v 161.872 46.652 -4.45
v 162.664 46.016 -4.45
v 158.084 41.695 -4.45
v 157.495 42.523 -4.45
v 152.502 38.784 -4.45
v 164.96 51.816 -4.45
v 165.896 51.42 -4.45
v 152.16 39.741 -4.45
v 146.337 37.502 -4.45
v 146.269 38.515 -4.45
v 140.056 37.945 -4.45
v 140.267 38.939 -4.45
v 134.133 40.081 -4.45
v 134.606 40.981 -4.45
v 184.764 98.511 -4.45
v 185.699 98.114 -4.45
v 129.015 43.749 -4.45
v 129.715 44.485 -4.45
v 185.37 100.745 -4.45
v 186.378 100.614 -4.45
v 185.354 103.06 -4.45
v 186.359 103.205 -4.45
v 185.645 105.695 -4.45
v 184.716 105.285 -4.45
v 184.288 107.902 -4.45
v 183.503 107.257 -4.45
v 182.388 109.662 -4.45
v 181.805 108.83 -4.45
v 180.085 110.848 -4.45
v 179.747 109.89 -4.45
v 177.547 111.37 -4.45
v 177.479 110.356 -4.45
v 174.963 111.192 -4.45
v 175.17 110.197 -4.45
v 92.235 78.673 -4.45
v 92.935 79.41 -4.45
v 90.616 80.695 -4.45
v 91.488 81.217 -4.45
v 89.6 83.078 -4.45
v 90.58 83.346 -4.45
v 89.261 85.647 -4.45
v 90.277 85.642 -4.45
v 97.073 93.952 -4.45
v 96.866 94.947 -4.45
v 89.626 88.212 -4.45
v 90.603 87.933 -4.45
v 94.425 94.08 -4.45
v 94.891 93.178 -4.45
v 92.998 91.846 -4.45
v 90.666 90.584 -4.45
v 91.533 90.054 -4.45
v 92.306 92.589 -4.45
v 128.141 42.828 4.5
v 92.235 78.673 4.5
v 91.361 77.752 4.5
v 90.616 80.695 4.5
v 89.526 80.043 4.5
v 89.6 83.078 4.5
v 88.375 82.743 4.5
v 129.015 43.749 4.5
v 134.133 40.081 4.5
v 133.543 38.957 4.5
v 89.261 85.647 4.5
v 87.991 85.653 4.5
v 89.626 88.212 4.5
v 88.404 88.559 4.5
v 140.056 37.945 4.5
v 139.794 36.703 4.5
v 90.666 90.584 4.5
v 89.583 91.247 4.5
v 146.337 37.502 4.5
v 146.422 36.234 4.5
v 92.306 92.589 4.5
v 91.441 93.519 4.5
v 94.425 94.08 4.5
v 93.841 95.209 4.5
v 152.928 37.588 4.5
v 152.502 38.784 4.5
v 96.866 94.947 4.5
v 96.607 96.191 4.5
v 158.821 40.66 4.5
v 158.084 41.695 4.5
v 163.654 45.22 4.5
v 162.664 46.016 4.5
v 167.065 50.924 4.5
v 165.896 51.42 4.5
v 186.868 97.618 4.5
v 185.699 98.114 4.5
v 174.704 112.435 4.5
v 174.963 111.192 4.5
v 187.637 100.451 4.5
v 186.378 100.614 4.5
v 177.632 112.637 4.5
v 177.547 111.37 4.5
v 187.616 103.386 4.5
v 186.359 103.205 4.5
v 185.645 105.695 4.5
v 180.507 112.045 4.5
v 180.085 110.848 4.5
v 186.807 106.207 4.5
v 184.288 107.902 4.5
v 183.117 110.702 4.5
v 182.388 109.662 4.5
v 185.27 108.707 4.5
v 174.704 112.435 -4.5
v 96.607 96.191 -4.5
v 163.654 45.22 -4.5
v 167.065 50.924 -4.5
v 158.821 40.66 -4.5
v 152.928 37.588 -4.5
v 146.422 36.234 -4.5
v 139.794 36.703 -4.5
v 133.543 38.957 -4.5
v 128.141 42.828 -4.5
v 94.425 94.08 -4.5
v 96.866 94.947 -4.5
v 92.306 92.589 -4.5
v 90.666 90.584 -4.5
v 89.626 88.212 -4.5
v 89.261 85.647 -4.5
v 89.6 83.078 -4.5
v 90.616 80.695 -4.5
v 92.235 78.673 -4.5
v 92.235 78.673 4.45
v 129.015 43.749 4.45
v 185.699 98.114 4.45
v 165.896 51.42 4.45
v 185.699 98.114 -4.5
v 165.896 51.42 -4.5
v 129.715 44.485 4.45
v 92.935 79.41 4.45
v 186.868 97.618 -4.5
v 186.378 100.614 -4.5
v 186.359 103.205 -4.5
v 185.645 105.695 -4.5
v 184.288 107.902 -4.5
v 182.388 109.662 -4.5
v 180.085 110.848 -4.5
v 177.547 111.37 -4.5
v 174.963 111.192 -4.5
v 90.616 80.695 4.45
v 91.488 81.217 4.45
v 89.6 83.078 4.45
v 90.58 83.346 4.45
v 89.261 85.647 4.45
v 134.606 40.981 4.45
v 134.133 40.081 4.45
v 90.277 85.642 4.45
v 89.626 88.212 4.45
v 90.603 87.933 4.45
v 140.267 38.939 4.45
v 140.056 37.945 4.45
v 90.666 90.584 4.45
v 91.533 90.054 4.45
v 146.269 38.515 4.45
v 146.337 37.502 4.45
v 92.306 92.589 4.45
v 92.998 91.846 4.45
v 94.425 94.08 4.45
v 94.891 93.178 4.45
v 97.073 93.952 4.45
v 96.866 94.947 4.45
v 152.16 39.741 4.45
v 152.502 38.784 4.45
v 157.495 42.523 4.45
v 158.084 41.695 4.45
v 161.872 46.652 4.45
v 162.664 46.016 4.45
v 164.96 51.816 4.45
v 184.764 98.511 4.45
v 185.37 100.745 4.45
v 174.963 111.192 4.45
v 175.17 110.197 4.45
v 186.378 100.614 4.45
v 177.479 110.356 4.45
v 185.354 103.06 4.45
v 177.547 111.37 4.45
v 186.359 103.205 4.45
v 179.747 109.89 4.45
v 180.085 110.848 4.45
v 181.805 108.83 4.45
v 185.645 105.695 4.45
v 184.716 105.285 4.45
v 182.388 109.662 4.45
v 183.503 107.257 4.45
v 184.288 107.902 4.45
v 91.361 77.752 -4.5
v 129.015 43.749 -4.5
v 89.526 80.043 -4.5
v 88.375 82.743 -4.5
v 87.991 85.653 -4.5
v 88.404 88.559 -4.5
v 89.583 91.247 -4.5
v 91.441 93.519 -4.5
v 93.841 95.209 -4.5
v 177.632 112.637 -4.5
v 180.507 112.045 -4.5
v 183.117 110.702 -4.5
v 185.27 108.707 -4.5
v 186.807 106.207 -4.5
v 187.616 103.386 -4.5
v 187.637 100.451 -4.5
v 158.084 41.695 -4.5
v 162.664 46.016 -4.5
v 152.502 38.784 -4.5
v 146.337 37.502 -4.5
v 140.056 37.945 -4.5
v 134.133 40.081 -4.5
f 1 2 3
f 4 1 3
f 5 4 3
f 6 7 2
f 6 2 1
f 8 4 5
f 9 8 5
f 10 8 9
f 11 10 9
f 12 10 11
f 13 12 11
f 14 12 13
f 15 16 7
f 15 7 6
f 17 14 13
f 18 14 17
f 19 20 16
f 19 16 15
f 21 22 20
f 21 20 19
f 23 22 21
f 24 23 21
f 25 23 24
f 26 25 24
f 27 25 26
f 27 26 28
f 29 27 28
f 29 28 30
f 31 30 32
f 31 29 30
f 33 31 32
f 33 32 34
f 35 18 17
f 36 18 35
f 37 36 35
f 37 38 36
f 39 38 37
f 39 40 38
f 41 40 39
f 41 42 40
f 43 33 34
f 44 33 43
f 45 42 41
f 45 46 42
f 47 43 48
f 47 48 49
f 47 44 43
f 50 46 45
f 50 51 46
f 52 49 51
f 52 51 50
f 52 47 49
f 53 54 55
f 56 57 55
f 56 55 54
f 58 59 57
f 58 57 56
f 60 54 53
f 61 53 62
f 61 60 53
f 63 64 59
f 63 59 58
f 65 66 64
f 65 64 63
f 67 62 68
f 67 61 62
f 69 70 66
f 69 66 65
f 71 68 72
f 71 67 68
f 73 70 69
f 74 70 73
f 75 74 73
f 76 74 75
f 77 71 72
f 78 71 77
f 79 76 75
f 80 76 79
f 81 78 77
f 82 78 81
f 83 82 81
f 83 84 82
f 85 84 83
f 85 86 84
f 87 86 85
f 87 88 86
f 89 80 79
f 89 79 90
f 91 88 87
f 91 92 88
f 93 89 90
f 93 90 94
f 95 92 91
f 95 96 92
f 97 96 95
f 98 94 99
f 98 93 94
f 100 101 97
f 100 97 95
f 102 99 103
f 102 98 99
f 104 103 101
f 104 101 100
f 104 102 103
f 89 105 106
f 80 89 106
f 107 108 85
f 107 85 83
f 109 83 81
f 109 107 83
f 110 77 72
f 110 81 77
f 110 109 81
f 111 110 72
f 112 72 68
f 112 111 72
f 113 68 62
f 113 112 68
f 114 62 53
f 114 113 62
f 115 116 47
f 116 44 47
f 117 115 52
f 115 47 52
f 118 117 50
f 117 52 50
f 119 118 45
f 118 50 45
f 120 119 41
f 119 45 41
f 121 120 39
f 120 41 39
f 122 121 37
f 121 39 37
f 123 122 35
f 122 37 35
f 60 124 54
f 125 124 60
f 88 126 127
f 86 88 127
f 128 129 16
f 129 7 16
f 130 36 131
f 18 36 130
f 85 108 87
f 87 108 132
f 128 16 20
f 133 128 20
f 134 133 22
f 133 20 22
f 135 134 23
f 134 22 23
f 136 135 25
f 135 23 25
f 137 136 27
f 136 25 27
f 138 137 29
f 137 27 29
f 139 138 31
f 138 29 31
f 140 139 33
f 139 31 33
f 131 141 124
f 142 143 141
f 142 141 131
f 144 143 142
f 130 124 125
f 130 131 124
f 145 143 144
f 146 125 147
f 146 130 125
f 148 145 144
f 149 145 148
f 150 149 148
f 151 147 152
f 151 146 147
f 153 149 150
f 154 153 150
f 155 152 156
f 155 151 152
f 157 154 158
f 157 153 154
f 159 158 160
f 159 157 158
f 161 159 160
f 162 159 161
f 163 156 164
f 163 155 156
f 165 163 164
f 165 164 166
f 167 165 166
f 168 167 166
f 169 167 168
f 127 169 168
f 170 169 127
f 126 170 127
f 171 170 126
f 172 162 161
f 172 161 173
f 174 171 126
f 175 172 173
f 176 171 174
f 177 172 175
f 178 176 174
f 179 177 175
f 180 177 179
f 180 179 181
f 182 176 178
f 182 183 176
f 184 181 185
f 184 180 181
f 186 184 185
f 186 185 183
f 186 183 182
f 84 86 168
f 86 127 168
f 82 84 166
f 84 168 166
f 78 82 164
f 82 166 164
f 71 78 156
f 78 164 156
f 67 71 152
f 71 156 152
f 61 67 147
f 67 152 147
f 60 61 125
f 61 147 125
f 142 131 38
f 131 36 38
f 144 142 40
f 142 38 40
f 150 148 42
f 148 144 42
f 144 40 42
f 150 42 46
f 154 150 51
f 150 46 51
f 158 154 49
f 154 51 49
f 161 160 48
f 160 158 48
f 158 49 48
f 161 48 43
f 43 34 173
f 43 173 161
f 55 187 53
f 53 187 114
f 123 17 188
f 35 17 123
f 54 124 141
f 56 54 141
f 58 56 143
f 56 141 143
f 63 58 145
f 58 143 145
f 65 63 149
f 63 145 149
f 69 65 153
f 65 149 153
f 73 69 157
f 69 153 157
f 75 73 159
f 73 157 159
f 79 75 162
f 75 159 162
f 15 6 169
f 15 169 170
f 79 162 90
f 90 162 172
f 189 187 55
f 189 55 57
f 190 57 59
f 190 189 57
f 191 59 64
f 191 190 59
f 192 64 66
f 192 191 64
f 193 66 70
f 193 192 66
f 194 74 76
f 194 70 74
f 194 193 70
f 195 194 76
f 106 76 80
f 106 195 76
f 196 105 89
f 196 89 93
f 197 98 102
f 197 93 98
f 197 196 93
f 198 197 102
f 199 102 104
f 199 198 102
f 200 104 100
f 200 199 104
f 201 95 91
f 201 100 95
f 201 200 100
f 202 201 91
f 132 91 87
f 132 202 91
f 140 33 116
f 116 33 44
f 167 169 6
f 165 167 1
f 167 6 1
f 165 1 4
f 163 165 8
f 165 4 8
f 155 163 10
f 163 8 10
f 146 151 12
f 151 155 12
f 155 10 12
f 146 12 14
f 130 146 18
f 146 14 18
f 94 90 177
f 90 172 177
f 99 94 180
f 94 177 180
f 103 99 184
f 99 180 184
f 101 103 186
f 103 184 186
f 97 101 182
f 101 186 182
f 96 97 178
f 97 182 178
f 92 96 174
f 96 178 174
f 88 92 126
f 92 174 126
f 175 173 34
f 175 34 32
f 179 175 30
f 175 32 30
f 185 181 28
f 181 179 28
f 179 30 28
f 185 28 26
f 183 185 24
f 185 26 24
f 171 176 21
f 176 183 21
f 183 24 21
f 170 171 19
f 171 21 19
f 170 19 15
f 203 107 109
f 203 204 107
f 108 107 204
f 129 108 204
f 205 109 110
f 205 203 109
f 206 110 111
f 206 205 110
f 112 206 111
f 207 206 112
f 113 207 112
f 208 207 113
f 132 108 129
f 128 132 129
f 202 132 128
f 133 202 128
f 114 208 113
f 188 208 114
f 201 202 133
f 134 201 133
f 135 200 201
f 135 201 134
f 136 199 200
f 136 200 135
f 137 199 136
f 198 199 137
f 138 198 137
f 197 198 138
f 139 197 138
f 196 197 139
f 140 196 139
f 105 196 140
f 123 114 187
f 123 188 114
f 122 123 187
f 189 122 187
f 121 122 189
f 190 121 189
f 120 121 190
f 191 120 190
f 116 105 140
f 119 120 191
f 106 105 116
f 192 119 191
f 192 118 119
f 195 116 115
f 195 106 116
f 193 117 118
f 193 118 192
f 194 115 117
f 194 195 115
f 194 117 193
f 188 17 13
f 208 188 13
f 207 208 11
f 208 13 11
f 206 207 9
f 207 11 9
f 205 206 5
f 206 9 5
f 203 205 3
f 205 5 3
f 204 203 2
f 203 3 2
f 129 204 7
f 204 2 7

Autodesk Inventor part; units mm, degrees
ref_plane "YZ Plane" through (0, 0, 0) normal (1, 0, 0) x (0, 1, 0)
ref_plane "XZ Plane" through (0, 0, 0) normal (0, 1, 0) x (-1, 0, 0)
ref_plane "XY Plane" through (0, 0, 0) normal (0, 0, 1) x (1, 0, 0)
sketch "Main Outline" plane through (0, 0, 0) normal (0, 0, 1) x (1, 0, 0)
  line L0 (0, 0) -> (304.8, 0) construction
  line L1 (304.8, 0) -> (304.8, 50.8) construction
  line L2 (304.8, 50.8) -> (0, 50.8) construction
  line L3 (0, 50.8) -> (0, 0) construction
  line L4 (0, 50.8) -> (0, 53.34) construction
  line L5 (0, 53.34) -> (304.8, 53.34) construction
  line L6 (304.8, 53.34) -> (304.8, 50.8) construction
  circle A0 centre (152.4, 23.8125) radius 17.4625 construction
  line L7 (152.4, 23.8125) -> (152.4, 0) construction
  circle A1 centre (152.4, 23.8125) radius 27.94 construction
  circle A2 centre (152.4, 23.8125) radius 21.59 construction
  line L8 (152.4, 23.8125) -> (144.7964, 60.3681) construction
  circle A3 centre (144.7964, 60.3681) radius 15.24 construction
  circle A4 centre (144.7964, 60.3681) radius 8.89 construction
  circle A5 centre (144.7964, 60.3681) radius 14.2875 construction
  arc A6 (164.6591, 71.8014) -> (129.0153, 43.7486) centre (144.7964, 60.3681) ccw construction
  circle A7 centre (98.8106, 85.598) radius 32.258 construction
  circle A8 centre (126.6733, 147.4971) radius 32.258 construction
  circle A9 centre (176.9075, 101.8424) radius 32.258 construction
  circle A10 centre (144.7964, 60.3681) radius 11.1125 construction
  circle A11 centre (152.4, 23.8125) radius 49.53 construction
  line L9 (144.7964, 60.3681) -> (126.6733, 147.4971) construction
  line L10 (144.7964, 60.3681) -> (98.8106, 85.598) construction
  line L11 (98.8106, 85.598) -> (176.9075, 101.8424) construction
  line L12 (176.9075, 101.8424) -> (144.7964, 60.3681) construction
  circle A12 centre (98.8106, 85.598) radius 9.5493 construction
  arc A13 (174.9629, 111.1915) -> (185.6989, 98.1139) centre (176.9075, 101.8424) ccw construction
  circle A14 centre (126.6733, 147.4971) radius 9.5493 construction
  line L13 (96.8659, 94.9472) -> (174.9629, 111.1915) construction
  line L14 (185.6989, 98.1139) -> (165.8956, 51.4198) construction
  line L15 (92.2351, 78.6732) -> (129.0153, 43.7486) construction
  line L16 (174.9629, 111.1915) -> (176.9075, 101.8424) construction
  line L17 (176.9075, 101.8424) -> (185.6989, 98.1139) construction
  arc A15 (185.6989, 98.1139) -> (174.9629, 111.1915) centre (176.9075, 101.8424) ccw construction
  arc A16 (165.8956, 51.4198) -> (164.6591, 71.8014) centre (144.7964, 60.3681) ccw construction
  arc A17 (129.0153, 43.7486) -> (165.8956, 51.4198) centre (144.7964, 60.3681) ccw construction
  circle A18 centre (126.6086, 147.808) radius 32.258 construction
  circle A19 centre (126.544, 148.1188) radius 32.258 construction
  circle A20 centre (126.4793, 148.4297) radius 32.258 construction
  line L18 (126.6733, 147.4971) -> (126.4793, 148.4297) construction
  circle A21 centre (126.738, 147.1863) radius 32.258 construction
  circle A22 centre (117.4622, 43.2997) radius 9.525 construction
  circle A23 centre (176.6694, 55.615) radius 9.525 construction
  line L19 (152.4, 23.8125) -> (117.4622, 43.2997) construction
  line L20 (152.4, 23.8125) -> (176.6694, 55.615) construction
  line L21 (117.4622, 43.2997) -> (98.8106, 85.598) construction
  line L22 (176.6694, 55.615) -> (176.9075, 101.8424) construction
  circle A24 centre (135.1821, 106.5897) radius 7.9375 construction
  line L23 (135.6243, 150.8242) -> (166.2787, 68.353) construction
  circle A25 centre (152.4, 23.8125) radius 29.845 construction
  line L24 (117.1381, 146.979) -> (121.9118, 59.1246) construction
  circle A26 centre (99.0889, 85.4453) radius 32.258 construction
  circle A27 centre (97.9755, 86.0562) radius 32.258 construction
  line L25 (97.9755, 86.0562) -> (98.8106, 85.598) construction
  circle A28 centre (98.2538, 85.9034) radius 32.258 construction
  circle A29 centre (98.5322, 85.7507) radius 32.258 construction
  circle A30 centre (152.4, 23.8125) radius 29.845 construction
  circle A31 centre (122.555, 23.8125) radius 6.35 construction
  circle A32 centre (179.7696, 35.7133) radius 6.35 construction
  line L26 (122.555, 23.8125) -> (152.4, 23.8125) construction
  line L27 (152.4, 23.8125) -> (182.245, 23.8125) construction
  circle A33 centre (182.245, 23.8125) radius 6.35 construction
  circle A34 centre (125.0304, 11.9117) radius 6.35 construction
  circle A35 centre (150.4199, 33.3321) radius 39.5684 construction
  line L28 (72.9795, 65.6655) -> (119.7593, 8.3204) construction
  circle A36 centre (177.4906, 102.5955) radius 32.258 construction
  line L29 (176.9075, 101.8424) -> (177.4906, 102.5955) construction
  circle A37 centre (177.2963, 102.3445) radius 32.258 construction
  circle A38 centre (177.1019, 102.0934) radius 32.258 construction
  circle A39 centre (176.7131, 101.5913) radius 32.258 construction
  line L30 (188.5109, 22.6209) -> (208.5442, 93.8632) construction
  circle A40 centre (135.1821, 106.5897) radius 9.5727 construction
  arc A41 (86.8202, 116.3239) -> (96.3065, 136.4856) centre (81.3304, 131.2195) ccw construction
  arc A42 (158.9123, 149.5077) -> (175.6513, 134.801) centre (174.7462, 150.6502) ccw construction
  line L31 (126.4793, 148.4297) -> (126.9966, 145.9429) construction
  line L32 (116.5322, 146.3607) -> (117.0495, 143.8739) construction
  line L33 (136.9437, 148.0119) -> (136.4264, 150.4987) construction
  arc A43 (136.4264, 150.4987) -> (116.5322, 146.3607) centre (126.4793, 148.4297) ccw construction
  arc A44 (117.0495, 143.8739) -> (136.9437, 148.0119) centre (126.9966, 145.9429) ccw construction
  line L34 (177.4906, 102.5955) -> (175.9357, 100.5871) construction
  line L35 (169.4571, 108.8154) -> (167.9021, 106.807) construction
  line L36 (183.9692, 94.3672) -> (185.5242, 96.3756) construction
  arc A45 (185.5242, 96.3756) -> (169.4571, 108.8154) centre (177.4906, 102.5955) ccw construction
  arc A46 (167.9021, 106.807) -> (183.9692, 94.3672) centre (175.9357, 100.5871) ccw construction
  line L37 (97.9755, 86.0562) -> (100.2023, 84.8344) construction
  line L38 (93.0884, 77.1487) -> (95.3153, 75.927) construction
  line L39 (105.0894, 93.7418) -> (102.8625, 94.9636) construction
  arc A47 (102.8625, 94.9636) -> (93.0884, 77.1487) centre (97.9755, 86.0562) ccw construction
  arc A48 (95.3153, 75.927) -> (105.0894, 93.7418) centre (100.2023, 84.8344) ccw construction
  circle A49 centre (117.4622, 43.2997) radius 3.9687 construction
  circle A50 centre (176.6694, 55.615) radius 3.9687 construction
  line L40 (152.4, 23.8125) -> (158.4777, -5.4071) construction
  arc A51 (89.4797, 54.6517) -> (86.0737, 49.6139) centre (88.534, 51.6209) ccw construction
  arc A52 (202.9367, 73.9217) -> (197.8043, 77.1835) centre (199.8802, 74.7812) ccw construction
  circle A53 centre (152.4, 23.8125) radius 14.224 construction
  circle A54 centre (135.1821, 106.5897) radius 3.9687 construction
  circle A55 centre (156.538, 3.9183) radius 6.35 construction
  circle A56 centre (156.538, 3.9183) radius 2.0828 construction
  circle A57 centre (152.4, 23.8125) radius 20.32 construction
  line L41 (133.1021, 30.1759) -> (152.4, 23.8125) construction
  line L42 (152.4, 23.8125) -> (167.5599, 37.3432) construction
  circle A58 centre (167.5599, 37.3432) radius 2.0828 construction
  circle A59 centre (167.5599, 37.3432) radius 3.9687 construction
  circle A60 centre (133.1021, 30.1759) radius 2.0828 construction
  circle A61 centre (133.1021, 30.1759) radius 3.9688 construction
  point P0 (126.738, 147.1863)
  point P1 (176.7131, 101.5913)
  dimension "d18" = 99.06
  dimension "d58" = 64.516
  dimension "d86" = 64.516
  dimension "d0" = 304.8
  dimension "d1" = 50.8
  dimension "d2" = 2.54
  dimension "d3" = 34.925
  dimension "d4" = 23.8125
  dimension "d5" = 152.4
  dimension "d6" = 55.88
  dimension "d7" = 43.18
  dimension "d8" = 37.338
  dimension "d10" = 30.48
  dimension "d11" = 17.78
  dimension "d12" = 28.575
  dimension "d13" = 45.8366
  dimension "d14" = 64.516
  dimension "d15" = 64.516
  dimension "d16" = 64.516
  dimension "d17" = 22.225
  dimension "d19" = 52.4523
  dimension "d20" = 88.9939
  dimension "d21" = 19.0986
  dimension "d22" = 19.0986
  dimension "d23" = 19.0986
  dimension "d30" = 124.732
  dimension "d40" = 64.516
  dimension "d41" = 64.516
  dimension "d42" = 64.516
  dimension "d43" = 0.9525
  dimension "d44" = 0.3175
  dimension "d45" = 0.635
  dimension "d46" = 64.516
  dimension "d47" = 0.3175
  dimension "d48" = 19.05
  dimension "d49" = 19.05
  dimension "d50" = 40.005
  dimension "d51" = 40.005
  dimension "d52" = 46.228
  dimension "d54" = 46.228
  dimension "d55" = 15.875
  dimension "d56" = 41.4655
  dimension "d57" = 59.69
  dimension "d59" = 64.516
  dimension "d60" = 64.516
  dimension "d61" = 64.516
  dimension "d62" = 0.3175
  dimension "d63" = 0.3175
  dimension "d64" = 0.635
  dimension "d65" = 0.9525
  dimension "d73" = 12.7
  dimension "d74" = 12.7
  dimension "d76" = 59.69
  dimension "d78" = 12.7
  dimension "d79" = 12.7
  dimension "d80" = 64.516
  dimension "d81" = 0.9525
  dimension "d82" = 64.516
  dimension "d83" = 64.516
  dimension "d84" = 0.3175
  dimension "d85" = 0.635
  dimension "d88" = 0.3175
  dimension "d89" = 31.75
  dimension "d90" = 31.75
  dimension "d94" = 1.5875
  dimension "d95" = 20.32
  dimension "d96" = 1.5875
sketch "Upper CIM C-C Check" plane through (0, 0, 0) normal (0, 0, 1) x (1, 0, 0)
  arc A0 (3.4429, -22.6582) -> (3.4429, 22.6582) centre (0, 0) ccw construction
  arc A1 (90.4285, 9.4409) -> (90.4285, -9.4409) centre (88.9939, 0) ccw construction
  line L0 (88.9939, 0) -> (0, 0) construction
  line L1 (90.4285, 9.4409) -> (3.4429, 22.6582)
  line L2 (3.4429, -22.6582) -> (90.4285, -9.4409)
  arc A2 (90.4285, -9.4409) -> (90.4285, 9.4409) centre (88.9939, 0) ccw
  arc A3 (3.4429, 22.6582) -> (3.4429, -22.6582) centre (0, 0) ccw
  dimension "d24" = 45.8366
  dimension "d25" = 19.0986
  dimension "d26" = 78.9119
  dimension "d27" = 87.984
  dimension "d28" = 27.12
  dimension "d29" = 88.9939
sketch "Sketch3" plane through (0, 0, 0) normal (0, 0, 1) x (1, 0, 0)
  line L0 (96.8659, 94.9472) -> (174.9629, 111.1915) projected
  line L1 (185.6989, 98.1139) -> (165.8956, 51.4198) projected
  line L2 (92.2351, 78.6732) -> (129.0153, 43.7486) projected
  arc A0 (96.8659, 94.9472) -> (92.2351, 78.6732) centre (98.8106, 85.598) ccw
  arc A1 (185.6989, 98.1139) -> (174.9629, 111.1915) centre (176.9075, 101.8424) ccw
  arc A2 (129.0153, 43.7486) -> (165.8956, 51.4198) centre (144.7964, 60.3681) ccw
  line L3 (175.1698, 110.1968) -> (97.0728, 93.9525)
  arc A3 (97.0728, 93.9525) -> (92.9347, 79.41) centre (98.8106, 85.598) ccw
  line L4 (92.9347, 79.41) -> (129.7149, 44.4854)
  arc A4 (129.7149, 44.4854) -> (164.9602, 51.8165) centre (144.7964, 60.3681) ccw
  line L5 (164.9602, 51.8165) -> (184.7635, 98.5106)
  arc A5 (184.7635, 98.5106) -> (175.1698, 110.1968) centre (176.9075, 101.8424) ccw
  line L6 (174.7042, 112.4349) -> (96.6073, 96.1906)
  arc A6 (96.6073, 96.1906) -> (91.3606, 77.7523) centre (98.8106, 85.598) ccw
  line L7 (91.3606, 77.7523) -> (128.1408, 42.8276)
  arc A7 (128.1408, 42.8276) -> (167.0648, 50.9239) centre (144.7964, 60.3681) ccw
  line L8 (167.0648, 50.9239) -> (186.8681, 97.618)
  arc A8 (186.8681, 97.618) -> (174.7042, 112.4349) centre (176.9075, 101.8424) ccw
  point P0 (0, 0)
  dimension "d115" = 1.27
  dimension "d116" = 1.016
extrude "Extrusion1" add sketch "Sketch3" along normal blind 4.5 contours A8 L8 A7 L7 A6 L6
extrude "Extrusion2" add sketch "Sketch3" along normal blind 4.45 contours L0 A1 L1 A2 L2 A0
mirror "Mirror1" about plane through (140.8105, 79.5306, 0) normal (0, 0, -1)
equation "\"d3\" = r10"
equation "\"d6\" = g44"
equation "\"d7\" = g34"
equation "\"d10\" = g24"
equation "\"d11\" = g14"
equation "\"d12\" = r8"
equation "\"d13\" = p48"
equation "\"d14\" = cim"
equation "\"d15\" = cim"
equation "\"d16\" = cim"
equation "\"d17\" = r6"
equation "\"d21\" = p20"
equation "\"d22\" = p20"
equation "\"d23\" = p20"
equation "\"d24\" = p48"
equation "\"d25\" = p20"
equation "\"d29\" = d20"
equation "\"g14\" = 17.78"
equation "\"g24\" = 30.48"
equation "\"g34\" = 43.18"
equation "\"g44\" = 55.88"
equation "\"p20\" = 19.09859"
equation "\"p48\" = 45.83662"
equation "\"r10\" = 34.925"
equation "\"r9\" = 31.75"
equation "\"r8\" = 28.575"
equation "\"r7\" = 25.4"
equation "\"r6\" = 22.225"
equation "\"r5\" = 19.05"
equation "\"r4\" = 15.875"
equation "\"r3\" = 12.7"
equation "\"cim\" = 64.516"
equation "\"act\" = 28.448"
equation "\"actL\" = 23.749"
equation "\"UpperCimCCCheck\" = 2 * d27 + d26 + d28"
equation "\"LowerBeltPathCCCheck\" = 267"
properties material "Rubber"
